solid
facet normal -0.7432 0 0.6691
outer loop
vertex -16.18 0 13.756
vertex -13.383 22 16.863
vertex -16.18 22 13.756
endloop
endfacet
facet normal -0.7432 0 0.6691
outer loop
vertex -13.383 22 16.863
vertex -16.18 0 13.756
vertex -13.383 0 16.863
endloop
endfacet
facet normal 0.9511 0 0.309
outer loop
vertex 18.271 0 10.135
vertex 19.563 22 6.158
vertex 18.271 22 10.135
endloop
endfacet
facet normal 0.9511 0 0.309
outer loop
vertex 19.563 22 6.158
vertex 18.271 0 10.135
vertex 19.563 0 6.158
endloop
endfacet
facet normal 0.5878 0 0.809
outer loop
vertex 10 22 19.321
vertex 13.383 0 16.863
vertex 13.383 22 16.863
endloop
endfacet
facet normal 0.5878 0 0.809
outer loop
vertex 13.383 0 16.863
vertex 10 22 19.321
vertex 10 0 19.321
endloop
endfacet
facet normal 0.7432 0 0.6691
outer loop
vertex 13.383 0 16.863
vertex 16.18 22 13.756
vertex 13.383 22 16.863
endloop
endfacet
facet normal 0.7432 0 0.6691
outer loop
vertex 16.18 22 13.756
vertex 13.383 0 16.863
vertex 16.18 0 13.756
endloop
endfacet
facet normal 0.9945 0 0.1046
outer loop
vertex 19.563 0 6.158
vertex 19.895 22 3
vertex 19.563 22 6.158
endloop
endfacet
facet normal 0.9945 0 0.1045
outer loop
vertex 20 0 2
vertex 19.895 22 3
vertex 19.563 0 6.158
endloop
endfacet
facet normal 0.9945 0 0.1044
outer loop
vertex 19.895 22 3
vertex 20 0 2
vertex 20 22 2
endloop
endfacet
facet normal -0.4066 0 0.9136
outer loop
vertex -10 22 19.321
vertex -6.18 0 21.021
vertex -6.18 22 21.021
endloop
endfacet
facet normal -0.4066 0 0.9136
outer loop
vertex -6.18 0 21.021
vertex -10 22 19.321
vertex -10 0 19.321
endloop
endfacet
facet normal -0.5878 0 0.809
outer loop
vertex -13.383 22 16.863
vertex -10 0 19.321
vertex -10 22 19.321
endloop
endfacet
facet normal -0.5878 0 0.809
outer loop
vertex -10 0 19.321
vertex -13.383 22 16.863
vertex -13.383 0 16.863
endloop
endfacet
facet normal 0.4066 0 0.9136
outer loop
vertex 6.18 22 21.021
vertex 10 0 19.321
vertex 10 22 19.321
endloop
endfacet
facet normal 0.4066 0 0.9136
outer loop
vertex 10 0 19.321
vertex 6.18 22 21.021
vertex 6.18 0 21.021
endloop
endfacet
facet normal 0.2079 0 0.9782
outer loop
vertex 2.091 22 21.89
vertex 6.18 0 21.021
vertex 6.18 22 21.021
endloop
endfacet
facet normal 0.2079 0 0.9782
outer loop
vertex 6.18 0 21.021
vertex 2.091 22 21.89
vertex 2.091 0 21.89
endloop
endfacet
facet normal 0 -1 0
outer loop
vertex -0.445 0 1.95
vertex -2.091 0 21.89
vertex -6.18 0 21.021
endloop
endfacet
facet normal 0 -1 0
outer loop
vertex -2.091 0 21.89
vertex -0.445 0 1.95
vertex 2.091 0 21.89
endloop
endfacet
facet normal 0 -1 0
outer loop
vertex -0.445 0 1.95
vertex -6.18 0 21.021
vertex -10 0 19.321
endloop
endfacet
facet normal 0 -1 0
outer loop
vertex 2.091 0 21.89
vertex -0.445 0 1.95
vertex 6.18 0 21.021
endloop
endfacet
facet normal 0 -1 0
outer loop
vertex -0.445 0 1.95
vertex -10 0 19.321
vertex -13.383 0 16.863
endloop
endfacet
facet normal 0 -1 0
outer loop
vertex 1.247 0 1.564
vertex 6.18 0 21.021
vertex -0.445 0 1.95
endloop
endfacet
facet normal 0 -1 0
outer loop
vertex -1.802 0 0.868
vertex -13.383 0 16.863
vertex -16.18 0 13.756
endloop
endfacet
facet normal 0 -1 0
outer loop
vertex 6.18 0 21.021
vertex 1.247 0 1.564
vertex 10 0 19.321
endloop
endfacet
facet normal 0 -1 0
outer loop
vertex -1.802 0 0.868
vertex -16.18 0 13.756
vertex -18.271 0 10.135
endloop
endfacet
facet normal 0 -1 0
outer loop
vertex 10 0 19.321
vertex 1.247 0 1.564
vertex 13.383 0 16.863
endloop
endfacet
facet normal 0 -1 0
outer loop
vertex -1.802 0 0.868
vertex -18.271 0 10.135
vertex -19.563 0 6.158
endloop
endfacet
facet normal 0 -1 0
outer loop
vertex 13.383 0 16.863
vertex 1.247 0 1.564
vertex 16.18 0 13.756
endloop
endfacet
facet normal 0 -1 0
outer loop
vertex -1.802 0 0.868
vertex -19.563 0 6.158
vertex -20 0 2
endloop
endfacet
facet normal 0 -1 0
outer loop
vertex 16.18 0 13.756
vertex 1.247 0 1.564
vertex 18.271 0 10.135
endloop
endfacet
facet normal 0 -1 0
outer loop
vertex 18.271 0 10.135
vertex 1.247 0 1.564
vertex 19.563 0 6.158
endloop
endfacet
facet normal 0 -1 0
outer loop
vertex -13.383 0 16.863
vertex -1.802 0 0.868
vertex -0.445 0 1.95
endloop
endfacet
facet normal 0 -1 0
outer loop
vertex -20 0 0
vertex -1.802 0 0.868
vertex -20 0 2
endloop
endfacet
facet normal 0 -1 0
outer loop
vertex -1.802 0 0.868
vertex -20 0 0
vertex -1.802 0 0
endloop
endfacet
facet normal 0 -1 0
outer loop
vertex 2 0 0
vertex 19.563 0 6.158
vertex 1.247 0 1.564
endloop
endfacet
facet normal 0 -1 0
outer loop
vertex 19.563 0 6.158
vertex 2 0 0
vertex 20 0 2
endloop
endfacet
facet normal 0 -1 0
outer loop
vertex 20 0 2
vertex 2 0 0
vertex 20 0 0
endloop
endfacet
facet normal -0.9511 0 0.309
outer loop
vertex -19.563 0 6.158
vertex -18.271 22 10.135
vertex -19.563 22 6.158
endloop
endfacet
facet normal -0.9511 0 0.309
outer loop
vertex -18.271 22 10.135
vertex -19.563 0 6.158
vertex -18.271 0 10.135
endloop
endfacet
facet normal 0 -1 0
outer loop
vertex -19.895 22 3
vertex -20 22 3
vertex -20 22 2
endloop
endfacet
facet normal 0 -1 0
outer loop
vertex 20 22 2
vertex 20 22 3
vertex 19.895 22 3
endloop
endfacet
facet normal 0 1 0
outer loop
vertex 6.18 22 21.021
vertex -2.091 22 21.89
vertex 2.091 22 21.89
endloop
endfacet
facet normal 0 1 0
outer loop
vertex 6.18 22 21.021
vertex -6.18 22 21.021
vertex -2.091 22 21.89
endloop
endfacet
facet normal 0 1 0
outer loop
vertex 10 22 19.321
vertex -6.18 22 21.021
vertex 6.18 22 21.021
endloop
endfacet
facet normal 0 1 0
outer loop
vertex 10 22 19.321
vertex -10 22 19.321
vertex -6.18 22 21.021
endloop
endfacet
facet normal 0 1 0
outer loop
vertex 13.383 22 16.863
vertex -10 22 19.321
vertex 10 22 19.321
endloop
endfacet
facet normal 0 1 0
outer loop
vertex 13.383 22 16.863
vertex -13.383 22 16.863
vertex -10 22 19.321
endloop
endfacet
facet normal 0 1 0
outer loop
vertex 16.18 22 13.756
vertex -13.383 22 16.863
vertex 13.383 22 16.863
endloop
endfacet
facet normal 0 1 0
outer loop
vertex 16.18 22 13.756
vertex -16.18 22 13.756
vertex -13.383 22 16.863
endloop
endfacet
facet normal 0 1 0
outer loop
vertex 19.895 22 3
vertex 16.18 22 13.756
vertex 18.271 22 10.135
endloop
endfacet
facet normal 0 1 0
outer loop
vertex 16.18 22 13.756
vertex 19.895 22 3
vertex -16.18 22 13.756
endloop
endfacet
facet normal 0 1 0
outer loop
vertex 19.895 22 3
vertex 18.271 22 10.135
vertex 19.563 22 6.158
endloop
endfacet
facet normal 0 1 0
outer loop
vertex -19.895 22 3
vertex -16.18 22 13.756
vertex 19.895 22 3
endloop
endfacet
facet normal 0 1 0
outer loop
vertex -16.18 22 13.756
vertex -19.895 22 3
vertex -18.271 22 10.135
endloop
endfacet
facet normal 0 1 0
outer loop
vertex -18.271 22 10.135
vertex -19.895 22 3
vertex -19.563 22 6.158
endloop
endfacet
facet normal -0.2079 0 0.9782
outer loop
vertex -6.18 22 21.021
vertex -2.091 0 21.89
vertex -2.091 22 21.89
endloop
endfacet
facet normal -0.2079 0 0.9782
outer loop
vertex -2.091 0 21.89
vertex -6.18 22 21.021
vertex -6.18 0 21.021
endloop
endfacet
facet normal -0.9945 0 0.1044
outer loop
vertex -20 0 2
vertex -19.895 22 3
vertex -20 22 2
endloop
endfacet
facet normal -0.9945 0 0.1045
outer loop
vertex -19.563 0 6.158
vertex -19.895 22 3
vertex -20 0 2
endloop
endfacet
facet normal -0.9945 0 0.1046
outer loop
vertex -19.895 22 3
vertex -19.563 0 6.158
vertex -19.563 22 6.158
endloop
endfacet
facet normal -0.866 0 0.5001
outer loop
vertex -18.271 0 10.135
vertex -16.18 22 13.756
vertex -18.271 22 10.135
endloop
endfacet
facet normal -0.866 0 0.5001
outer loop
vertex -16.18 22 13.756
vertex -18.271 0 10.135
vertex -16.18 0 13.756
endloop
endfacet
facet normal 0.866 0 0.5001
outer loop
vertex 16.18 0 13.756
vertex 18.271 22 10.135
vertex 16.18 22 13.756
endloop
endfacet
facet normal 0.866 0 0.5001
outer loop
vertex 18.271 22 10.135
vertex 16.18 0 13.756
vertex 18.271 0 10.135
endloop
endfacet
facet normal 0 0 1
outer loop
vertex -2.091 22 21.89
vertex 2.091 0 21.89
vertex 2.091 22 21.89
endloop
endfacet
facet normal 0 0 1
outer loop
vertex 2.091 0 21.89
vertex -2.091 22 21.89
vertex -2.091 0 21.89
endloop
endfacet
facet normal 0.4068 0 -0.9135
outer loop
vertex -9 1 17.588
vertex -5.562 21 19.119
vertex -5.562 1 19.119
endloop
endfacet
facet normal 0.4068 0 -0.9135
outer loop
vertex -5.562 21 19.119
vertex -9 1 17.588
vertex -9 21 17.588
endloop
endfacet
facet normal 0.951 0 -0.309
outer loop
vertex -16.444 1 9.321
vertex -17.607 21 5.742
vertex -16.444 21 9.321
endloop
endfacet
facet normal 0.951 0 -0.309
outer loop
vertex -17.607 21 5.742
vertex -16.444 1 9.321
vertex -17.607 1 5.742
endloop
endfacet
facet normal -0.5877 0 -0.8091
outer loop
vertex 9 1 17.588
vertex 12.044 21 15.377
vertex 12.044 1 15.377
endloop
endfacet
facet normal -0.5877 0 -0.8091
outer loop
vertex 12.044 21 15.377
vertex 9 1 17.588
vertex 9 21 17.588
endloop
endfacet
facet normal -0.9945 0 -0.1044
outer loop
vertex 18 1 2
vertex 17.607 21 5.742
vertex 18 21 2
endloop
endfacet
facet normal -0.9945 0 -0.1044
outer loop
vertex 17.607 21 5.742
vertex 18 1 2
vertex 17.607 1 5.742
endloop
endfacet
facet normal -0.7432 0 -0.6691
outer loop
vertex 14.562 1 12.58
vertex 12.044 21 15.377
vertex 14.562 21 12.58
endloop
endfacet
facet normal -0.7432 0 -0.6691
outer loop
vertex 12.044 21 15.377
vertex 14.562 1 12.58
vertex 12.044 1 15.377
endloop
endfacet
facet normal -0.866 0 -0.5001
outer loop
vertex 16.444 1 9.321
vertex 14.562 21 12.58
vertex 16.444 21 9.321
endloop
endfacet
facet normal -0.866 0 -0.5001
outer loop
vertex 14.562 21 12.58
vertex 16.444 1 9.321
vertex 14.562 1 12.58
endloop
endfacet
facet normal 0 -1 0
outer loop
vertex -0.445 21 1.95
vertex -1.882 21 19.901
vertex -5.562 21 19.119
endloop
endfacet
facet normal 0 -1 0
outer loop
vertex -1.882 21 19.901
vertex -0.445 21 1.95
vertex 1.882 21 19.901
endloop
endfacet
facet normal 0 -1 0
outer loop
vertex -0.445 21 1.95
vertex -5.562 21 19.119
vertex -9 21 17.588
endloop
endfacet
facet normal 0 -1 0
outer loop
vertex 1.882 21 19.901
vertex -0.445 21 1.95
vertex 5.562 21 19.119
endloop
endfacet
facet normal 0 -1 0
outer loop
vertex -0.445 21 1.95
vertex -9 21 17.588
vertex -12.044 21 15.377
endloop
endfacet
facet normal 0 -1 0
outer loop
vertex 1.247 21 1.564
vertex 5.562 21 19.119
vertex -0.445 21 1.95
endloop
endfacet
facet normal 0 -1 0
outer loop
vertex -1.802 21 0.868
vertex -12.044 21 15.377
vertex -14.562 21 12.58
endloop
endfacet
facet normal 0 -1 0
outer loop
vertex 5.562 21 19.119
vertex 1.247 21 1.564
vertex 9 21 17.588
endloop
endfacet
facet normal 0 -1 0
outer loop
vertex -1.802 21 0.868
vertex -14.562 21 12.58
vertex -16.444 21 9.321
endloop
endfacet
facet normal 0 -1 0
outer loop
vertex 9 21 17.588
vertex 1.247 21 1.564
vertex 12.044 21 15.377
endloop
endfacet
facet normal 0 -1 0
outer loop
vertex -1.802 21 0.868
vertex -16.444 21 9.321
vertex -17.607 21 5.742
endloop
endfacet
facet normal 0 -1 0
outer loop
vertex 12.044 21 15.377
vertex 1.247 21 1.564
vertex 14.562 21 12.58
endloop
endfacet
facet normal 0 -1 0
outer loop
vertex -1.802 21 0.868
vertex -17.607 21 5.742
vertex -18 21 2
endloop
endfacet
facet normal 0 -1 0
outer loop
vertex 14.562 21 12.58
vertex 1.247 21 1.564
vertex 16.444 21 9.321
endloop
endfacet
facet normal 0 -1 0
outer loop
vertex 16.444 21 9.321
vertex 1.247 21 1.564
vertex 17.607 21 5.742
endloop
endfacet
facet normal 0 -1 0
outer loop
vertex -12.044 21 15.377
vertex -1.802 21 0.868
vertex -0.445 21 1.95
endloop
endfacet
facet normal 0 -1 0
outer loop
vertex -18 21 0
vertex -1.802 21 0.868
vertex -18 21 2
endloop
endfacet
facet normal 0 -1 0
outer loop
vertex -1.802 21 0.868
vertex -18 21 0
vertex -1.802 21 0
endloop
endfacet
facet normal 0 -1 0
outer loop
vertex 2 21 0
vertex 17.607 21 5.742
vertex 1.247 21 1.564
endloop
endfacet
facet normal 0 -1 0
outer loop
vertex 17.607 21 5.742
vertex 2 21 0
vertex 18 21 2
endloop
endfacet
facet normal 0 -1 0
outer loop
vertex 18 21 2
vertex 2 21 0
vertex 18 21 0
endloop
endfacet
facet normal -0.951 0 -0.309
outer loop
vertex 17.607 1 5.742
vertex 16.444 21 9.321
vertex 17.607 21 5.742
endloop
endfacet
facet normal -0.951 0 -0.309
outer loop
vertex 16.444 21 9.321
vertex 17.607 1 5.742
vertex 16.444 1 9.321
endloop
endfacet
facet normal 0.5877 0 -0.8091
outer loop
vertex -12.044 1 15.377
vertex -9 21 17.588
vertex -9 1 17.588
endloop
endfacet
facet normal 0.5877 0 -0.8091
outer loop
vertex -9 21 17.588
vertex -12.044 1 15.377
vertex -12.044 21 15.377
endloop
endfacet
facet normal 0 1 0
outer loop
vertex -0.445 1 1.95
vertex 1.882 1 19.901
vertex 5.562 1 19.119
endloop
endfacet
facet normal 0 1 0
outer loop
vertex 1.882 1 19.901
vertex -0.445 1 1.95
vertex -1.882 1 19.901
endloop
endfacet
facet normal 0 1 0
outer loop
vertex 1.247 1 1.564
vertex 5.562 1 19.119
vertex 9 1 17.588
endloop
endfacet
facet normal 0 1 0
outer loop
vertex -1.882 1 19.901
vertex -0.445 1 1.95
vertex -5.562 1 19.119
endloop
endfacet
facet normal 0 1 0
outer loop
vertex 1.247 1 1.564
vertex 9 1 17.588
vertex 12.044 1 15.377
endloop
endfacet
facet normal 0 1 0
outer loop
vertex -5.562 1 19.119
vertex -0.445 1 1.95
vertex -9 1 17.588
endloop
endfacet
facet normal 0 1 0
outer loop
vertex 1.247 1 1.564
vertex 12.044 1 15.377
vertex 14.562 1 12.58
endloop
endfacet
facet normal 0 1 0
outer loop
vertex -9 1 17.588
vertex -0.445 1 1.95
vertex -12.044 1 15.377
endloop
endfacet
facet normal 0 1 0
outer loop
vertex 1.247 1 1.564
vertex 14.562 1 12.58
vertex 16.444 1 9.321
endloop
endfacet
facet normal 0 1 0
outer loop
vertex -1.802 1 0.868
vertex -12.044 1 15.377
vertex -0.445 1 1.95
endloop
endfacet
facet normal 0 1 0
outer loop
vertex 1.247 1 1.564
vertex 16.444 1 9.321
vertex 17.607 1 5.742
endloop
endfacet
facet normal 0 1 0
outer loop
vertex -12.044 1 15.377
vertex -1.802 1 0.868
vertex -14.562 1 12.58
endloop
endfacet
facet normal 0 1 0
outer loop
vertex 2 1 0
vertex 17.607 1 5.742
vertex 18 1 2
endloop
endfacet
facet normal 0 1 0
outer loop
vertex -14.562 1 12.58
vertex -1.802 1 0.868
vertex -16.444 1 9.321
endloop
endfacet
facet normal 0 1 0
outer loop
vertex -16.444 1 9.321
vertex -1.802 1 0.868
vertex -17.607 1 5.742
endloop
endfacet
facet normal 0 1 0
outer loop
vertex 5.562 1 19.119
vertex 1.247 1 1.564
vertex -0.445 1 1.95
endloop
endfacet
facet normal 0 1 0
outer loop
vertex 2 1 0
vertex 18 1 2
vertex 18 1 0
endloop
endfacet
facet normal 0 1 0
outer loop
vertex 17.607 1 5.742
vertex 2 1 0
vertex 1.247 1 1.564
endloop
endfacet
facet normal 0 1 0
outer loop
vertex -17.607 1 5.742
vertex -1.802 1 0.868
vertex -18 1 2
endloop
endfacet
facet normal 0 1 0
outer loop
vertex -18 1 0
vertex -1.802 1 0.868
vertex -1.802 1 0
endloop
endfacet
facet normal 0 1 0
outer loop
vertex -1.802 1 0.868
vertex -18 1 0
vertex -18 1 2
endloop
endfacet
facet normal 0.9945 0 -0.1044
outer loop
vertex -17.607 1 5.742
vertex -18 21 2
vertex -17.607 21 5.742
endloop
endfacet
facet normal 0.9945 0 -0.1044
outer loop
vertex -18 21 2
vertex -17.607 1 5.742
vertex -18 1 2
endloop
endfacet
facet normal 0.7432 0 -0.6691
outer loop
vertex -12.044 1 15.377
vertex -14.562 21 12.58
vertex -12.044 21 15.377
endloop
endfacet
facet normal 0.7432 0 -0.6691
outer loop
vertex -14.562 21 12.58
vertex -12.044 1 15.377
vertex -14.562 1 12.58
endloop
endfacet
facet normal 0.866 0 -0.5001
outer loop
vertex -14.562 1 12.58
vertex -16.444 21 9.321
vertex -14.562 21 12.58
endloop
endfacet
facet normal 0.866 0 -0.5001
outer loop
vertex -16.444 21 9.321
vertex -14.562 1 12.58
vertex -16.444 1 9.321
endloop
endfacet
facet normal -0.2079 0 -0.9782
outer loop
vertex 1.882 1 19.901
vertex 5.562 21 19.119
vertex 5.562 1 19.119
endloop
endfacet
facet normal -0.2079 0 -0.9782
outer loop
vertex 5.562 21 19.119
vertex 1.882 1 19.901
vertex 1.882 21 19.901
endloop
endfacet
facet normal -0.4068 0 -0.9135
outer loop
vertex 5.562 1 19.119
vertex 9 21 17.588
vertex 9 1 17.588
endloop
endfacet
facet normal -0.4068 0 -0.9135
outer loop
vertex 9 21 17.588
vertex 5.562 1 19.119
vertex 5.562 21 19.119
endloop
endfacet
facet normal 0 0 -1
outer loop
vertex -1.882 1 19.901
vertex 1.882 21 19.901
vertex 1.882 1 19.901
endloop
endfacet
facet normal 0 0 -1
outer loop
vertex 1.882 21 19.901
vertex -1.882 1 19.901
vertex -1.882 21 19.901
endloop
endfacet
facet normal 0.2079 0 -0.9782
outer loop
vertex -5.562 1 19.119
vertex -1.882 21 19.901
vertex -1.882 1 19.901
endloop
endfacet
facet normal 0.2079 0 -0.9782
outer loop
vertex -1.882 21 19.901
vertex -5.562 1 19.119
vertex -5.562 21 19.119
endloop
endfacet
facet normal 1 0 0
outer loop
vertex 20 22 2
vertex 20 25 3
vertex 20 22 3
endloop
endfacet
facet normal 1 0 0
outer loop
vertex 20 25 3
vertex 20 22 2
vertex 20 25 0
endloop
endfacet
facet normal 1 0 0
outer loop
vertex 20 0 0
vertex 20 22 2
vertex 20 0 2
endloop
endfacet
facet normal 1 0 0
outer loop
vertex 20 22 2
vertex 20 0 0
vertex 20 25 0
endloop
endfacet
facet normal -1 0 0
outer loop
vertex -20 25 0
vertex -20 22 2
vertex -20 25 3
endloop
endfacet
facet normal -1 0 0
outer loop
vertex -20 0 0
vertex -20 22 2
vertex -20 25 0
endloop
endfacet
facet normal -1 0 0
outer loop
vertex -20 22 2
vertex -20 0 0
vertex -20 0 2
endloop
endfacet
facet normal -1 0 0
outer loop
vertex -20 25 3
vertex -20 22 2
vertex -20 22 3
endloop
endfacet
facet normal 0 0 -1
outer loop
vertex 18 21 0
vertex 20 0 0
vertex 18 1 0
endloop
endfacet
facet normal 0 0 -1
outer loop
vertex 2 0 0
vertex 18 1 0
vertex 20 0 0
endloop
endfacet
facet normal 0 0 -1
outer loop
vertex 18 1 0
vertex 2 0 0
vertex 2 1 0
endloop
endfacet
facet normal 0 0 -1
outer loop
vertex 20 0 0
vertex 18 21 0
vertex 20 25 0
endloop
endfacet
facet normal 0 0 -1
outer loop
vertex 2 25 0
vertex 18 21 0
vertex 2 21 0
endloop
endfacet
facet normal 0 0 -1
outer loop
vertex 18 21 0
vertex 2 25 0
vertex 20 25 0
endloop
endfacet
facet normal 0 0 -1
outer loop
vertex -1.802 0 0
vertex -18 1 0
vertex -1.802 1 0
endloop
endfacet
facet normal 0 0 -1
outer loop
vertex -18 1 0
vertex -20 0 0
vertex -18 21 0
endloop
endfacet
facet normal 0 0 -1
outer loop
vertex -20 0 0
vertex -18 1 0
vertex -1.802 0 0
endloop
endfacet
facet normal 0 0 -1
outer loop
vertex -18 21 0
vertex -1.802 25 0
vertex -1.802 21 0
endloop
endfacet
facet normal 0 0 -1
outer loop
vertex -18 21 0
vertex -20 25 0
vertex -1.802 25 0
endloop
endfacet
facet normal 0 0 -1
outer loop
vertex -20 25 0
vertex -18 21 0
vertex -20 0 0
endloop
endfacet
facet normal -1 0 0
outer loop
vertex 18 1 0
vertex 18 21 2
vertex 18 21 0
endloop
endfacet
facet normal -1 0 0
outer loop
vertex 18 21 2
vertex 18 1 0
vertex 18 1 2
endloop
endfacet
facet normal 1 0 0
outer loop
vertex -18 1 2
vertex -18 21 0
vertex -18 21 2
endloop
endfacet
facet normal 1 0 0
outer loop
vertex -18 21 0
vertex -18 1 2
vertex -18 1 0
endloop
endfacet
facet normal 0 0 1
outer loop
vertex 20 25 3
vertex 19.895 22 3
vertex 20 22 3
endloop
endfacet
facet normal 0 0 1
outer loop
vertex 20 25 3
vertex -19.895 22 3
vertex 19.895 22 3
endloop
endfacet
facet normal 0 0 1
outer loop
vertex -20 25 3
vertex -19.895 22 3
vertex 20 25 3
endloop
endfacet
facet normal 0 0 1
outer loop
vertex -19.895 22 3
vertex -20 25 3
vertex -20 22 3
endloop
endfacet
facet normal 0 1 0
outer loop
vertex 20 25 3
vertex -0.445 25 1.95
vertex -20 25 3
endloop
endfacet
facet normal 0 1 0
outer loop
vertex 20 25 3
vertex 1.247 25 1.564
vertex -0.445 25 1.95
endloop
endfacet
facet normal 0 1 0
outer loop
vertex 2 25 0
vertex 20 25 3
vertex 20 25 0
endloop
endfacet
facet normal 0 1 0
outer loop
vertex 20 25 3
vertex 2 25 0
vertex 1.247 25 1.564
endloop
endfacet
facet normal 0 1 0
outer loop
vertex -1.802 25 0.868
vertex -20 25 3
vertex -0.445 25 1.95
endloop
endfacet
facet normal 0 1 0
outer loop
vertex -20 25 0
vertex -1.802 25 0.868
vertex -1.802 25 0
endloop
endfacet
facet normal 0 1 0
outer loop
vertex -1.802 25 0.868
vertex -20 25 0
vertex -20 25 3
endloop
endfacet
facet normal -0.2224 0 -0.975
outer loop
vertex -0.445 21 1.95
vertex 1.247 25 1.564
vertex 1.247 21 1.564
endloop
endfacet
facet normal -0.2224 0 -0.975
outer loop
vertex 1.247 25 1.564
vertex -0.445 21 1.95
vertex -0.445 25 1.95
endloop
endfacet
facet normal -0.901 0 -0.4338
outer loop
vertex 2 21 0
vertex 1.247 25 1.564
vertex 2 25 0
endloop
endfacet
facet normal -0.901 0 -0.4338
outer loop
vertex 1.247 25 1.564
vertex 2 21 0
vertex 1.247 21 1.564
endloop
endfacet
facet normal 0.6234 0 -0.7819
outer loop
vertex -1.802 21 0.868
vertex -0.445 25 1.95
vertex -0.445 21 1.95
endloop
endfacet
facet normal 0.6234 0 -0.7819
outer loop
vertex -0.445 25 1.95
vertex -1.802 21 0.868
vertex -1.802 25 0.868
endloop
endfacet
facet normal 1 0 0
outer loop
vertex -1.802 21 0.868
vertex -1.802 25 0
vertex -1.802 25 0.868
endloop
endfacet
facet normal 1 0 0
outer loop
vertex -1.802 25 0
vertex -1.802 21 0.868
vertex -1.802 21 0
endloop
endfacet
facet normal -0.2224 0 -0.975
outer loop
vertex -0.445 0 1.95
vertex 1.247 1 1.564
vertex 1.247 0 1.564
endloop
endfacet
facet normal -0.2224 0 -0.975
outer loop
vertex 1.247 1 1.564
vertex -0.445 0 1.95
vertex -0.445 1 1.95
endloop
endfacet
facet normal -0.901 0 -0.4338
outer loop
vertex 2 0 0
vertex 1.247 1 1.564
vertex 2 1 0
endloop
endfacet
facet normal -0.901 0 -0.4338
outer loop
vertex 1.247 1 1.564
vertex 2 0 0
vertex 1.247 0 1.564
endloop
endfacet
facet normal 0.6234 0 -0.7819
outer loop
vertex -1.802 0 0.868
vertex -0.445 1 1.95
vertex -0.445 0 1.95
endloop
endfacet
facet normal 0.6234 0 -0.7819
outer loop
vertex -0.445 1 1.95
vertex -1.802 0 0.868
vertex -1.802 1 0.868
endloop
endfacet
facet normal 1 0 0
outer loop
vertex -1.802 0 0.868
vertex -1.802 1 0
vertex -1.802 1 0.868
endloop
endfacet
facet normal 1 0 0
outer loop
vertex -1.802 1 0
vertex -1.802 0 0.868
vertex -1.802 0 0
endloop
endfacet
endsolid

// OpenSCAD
module closed_chamber(w=22, r=20, sidewall=1,topwall=2) {
           translate([0,0, topwall]) rotate([-90,0,0])
            union(){
            difference() {
                difference(){
                    cylinder(h=w, r=r, center=false);
                    translate([0,0, sidewall]) cylinder(h=(w-(sidewall*2)), r=(r-topwall), center=false);
                }
                translate([(-1 *r),0,(-1 * w)+1])cube([r*2, r*2, w*2]);
            }
            translate([(-1 * r),0,0])
            difference(){
                cube([(2 * r),topwall,w]);
                translate([topwall,-1,sidewall])cube([((r * 2) - (topwall * 2)),(topwall *2),(w - (sidewall * 2))]);
            }
        };
    };
    
module chamber(w=22, r=20, sidewall=1,topwall=2, air_channel=2) {
    difference(){
        closed_chamber(w,r,sidewall,topwall);
         translate([0,sidewall,0])
        rotate([90,0,0])
        cylinder(h=(sidewall*4), r=air_channel, center=true);
    };
};

module base(w=22, r=20, sidewall=1,topwall=2, air_channel=2, extension=3) {
    //air_channel=(extension /2);
    difference() {
        union(){
            closed_chamber(w,r,sidewall,topwall);
            translate([(-1 * r),w,0]) 
            cube([(r*2), extension, extension]);
        };
        translate([0,w,0])        
        rotate([90,0,0])
        cylinder(h=((sidewall+extension)*2), r=air_channel, center=true);
    }
};

module section(w=22, r=20, sidewall=1,topwall=2, air_channel=2, extension=3) {
 
     difference(){
        base(w,r,sidewall,topwall, air_channel, extension);
         translate([0,sidewall,0])
        rotate([90,0,0])
        cylinder(h=(sidewall*4), r=air_channel, center=true);
     }
}

module start () {}
module middle () {}
module end() {}
module complete() {}

module tentacle(w=22, r=20, sidewall=1,topwall=2, air_channel=2, extension=3, length=47,
    bedsize=223){

    safesize = bedsize-10;
    section_size = w+extension;
    per_print = floor(bedsize/ section_size);
    num = round(length / section_size);
        
        
}

section();
